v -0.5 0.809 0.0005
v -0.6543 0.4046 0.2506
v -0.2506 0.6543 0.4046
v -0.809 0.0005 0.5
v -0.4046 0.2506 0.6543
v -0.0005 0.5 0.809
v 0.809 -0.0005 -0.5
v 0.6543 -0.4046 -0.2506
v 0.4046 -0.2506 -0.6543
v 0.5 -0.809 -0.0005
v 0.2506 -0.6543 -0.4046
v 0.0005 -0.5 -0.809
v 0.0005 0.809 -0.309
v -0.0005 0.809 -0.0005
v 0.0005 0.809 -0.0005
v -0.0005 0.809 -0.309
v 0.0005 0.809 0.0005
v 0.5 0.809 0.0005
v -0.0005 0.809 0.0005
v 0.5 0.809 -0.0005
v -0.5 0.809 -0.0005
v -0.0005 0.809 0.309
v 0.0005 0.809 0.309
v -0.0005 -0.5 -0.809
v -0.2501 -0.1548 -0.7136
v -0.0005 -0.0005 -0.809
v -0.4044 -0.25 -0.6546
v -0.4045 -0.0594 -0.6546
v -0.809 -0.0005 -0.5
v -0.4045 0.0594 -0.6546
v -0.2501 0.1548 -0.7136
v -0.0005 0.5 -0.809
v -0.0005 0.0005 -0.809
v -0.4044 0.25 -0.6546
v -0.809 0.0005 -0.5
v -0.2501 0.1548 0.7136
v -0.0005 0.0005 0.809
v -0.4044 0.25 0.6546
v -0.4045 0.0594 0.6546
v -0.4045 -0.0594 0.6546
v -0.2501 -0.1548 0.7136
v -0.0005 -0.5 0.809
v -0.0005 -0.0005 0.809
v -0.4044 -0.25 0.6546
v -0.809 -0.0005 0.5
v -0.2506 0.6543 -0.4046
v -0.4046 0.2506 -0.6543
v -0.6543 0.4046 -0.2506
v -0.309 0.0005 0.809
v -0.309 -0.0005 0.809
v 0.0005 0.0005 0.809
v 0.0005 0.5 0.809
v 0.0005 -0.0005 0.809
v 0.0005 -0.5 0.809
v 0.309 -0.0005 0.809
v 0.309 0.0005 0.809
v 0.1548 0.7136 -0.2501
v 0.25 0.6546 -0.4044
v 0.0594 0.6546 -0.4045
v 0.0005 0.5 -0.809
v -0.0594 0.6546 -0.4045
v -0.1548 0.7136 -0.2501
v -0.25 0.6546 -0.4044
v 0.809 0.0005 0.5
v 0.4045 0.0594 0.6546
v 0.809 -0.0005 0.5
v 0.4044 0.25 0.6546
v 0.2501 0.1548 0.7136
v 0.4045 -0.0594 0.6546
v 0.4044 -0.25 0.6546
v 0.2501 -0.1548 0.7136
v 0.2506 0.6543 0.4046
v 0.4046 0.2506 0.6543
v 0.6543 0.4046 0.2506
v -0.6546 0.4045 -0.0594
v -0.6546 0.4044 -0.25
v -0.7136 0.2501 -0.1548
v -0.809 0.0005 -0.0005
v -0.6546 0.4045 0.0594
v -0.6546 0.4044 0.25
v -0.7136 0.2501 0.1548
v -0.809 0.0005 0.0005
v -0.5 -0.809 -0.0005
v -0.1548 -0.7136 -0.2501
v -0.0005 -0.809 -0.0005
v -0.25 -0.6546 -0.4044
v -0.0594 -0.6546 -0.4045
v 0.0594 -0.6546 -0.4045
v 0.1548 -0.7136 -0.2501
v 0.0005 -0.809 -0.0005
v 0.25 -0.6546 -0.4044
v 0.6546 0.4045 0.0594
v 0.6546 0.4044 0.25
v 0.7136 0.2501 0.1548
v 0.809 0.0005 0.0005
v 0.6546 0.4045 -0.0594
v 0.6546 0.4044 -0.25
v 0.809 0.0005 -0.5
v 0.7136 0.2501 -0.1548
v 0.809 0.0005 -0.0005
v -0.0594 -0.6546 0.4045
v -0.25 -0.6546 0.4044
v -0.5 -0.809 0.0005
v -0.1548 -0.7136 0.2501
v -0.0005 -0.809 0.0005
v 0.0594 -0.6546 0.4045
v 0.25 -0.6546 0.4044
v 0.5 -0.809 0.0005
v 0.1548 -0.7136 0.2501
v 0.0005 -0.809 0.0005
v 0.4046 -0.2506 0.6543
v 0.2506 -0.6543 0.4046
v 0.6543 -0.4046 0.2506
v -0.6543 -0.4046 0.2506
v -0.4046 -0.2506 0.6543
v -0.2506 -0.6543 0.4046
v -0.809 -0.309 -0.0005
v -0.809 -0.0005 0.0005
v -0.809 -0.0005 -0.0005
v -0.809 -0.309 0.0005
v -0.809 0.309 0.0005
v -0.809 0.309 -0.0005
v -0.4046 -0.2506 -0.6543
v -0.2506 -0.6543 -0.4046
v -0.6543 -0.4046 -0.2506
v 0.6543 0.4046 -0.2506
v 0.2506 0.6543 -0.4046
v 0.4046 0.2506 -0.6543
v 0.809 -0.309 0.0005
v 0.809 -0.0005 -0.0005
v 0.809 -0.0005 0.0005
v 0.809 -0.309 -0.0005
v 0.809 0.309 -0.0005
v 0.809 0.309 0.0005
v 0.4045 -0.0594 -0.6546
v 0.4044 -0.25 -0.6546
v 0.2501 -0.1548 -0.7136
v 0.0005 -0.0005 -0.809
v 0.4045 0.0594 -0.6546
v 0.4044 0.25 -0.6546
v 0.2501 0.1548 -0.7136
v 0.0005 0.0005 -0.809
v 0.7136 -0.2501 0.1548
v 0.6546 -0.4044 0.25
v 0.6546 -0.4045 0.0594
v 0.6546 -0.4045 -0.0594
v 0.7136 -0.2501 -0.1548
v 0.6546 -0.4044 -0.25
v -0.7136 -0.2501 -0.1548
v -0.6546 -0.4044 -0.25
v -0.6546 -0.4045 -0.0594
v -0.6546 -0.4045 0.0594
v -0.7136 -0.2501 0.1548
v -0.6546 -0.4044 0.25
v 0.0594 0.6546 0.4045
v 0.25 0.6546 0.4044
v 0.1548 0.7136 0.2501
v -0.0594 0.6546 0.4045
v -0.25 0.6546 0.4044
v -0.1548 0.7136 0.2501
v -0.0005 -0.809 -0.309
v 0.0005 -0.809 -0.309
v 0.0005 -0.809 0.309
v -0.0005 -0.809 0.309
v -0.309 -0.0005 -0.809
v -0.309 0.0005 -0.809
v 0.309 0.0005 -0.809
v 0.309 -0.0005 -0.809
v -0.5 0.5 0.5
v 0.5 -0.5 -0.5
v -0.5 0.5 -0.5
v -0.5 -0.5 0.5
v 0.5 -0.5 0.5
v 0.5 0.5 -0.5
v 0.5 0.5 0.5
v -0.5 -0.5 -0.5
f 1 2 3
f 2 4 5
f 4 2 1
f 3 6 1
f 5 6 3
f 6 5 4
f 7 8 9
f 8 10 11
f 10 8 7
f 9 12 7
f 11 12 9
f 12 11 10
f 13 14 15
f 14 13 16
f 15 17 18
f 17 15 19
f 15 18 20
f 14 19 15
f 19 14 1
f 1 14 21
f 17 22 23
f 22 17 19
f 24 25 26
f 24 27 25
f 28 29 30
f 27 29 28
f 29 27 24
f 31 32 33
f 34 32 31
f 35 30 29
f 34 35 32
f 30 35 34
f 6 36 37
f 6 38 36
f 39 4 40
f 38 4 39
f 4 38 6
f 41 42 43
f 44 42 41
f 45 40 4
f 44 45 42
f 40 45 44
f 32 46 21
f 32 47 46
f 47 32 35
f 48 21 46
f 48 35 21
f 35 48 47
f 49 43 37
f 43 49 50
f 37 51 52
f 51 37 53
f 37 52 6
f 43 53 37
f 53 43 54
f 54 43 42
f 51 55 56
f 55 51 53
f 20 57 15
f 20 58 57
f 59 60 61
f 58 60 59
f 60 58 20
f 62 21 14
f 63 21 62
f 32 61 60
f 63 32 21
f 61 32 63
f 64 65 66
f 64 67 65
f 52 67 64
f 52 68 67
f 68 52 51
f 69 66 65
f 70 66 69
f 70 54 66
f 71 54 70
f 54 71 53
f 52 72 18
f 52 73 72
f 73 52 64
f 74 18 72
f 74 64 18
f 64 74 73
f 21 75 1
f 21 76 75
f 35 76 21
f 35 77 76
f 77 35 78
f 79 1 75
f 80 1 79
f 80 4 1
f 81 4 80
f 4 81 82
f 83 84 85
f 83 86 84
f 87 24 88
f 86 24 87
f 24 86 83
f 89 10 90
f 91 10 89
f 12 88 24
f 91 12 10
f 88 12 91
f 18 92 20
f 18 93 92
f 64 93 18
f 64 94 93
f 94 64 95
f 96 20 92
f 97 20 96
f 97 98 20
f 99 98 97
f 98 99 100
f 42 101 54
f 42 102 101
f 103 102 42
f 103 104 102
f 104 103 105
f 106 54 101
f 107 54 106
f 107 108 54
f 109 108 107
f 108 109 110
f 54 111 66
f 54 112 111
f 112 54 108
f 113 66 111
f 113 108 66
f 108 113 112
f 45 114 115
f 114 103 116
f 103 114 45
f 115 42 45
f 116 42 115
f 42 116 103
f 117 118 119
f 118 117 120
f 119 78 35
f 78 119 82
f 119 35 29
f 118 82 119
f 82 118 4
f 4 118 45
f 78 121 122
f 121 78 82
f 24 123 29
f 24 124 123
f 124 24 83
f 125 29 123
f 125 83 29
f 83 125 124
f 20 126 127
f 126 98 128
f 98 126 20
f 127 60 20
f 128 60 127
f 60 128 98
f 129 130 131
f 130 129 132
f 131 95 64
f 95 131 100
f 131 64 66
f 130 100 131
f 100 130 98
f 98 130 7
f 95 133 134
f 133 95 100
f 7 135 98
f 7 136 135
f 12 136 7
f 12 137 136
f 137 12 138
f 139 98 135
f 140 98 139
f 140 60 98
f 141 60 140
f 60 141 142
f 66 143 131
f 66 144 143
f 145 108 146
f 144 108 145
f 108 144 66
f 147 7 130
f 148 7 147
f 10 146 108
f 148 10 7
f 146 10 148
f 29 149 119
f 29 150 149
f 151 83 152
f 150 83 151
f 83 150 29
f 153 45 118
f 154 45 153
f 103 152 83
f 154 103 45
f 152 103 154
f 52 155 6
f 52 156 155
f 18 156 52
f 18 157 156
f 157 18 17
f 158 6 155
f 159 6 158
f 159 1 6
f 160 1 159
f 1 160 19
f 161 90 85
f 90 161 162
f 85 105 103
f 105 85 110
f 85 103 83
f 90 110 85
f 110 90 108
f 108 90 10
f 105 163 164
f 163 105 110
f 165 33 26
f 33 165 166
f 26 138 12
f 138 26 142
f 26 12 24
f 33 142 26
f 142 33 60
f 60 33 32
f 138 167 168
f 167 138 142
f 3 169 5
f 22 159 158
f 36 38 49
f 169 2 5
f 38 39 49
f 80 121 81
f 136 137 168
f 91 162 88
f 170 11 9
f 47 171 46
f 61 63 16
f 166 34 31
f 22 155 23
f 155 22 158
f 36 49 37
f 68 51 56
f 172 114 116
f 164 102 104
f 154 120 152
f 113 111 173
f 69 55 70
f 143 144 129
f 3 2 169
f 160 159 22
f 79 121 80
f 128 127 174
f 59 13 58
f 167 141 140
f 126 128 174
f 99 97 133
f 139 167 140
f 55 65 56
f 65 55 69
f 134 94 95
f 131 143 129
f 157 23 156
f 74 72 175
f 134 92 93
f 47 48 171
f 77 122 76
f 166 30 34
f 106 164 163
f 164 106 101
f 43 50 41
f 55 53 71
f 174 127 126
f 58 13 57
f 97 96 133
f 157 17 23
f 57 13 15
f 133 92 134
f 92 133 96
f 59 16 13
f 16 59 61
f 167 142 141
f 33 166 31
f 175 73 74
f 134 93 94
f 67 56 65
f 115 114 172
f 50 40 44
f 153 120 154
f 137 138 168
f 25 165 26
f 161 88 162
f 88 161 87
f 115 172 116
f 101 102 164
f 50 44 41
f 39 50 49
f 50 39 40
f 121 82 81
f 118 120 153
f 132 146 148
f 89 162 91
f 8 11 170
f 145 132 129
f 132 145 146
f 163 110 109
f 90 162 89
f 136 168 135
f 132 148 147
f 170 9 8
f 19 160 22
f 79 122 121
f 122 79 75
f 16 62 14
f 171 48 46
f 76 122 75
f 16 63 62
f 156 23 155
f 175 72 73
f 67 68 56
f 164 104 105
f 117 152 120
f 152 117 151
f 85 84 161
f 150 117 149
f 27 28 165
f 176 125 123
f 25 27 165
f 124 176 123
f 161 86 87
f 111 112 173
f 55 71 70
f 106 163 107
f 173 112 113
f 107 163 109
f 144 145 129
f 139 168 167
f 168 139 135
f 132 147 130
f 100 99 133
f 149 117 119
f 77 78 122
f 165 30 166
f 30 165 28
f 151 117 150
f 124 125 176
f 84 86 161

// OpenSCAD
// Draws a polyhedron by its cartesian coordinates (simplified;
// all elements are assumed ±x).
module polyh(points) {
    // OpenSCAD can't draw zero widths, so, we have to make zeros an epsilon larger
    e = 0.001;
    function nonzerofy(xs) = [for (x = xs) x == 0 ? e : x];

    // Draw cubes and then take a convex hull of them
    hull() {
        for(p = points) {
            cube(nonzerofy(p), center=true);
        }
    }
}

phi = (1 + sqrt(5))/2;

module iko() {
    polyh([
        [0,1,phi],
        [1,phi,0],
        [phi,0,1]
    ]);
}

module dode() {
    polyh([
        [1, 1, 1],
        [0, phi, 1/phi],
        [1/phi, 0, phi],
        [phi, 1/phi, 0]
    ]);
}

// https://en.wikipedia.org/wiki/Compound_of_dodecahedron_and_icosahedron
iko();
dode();
